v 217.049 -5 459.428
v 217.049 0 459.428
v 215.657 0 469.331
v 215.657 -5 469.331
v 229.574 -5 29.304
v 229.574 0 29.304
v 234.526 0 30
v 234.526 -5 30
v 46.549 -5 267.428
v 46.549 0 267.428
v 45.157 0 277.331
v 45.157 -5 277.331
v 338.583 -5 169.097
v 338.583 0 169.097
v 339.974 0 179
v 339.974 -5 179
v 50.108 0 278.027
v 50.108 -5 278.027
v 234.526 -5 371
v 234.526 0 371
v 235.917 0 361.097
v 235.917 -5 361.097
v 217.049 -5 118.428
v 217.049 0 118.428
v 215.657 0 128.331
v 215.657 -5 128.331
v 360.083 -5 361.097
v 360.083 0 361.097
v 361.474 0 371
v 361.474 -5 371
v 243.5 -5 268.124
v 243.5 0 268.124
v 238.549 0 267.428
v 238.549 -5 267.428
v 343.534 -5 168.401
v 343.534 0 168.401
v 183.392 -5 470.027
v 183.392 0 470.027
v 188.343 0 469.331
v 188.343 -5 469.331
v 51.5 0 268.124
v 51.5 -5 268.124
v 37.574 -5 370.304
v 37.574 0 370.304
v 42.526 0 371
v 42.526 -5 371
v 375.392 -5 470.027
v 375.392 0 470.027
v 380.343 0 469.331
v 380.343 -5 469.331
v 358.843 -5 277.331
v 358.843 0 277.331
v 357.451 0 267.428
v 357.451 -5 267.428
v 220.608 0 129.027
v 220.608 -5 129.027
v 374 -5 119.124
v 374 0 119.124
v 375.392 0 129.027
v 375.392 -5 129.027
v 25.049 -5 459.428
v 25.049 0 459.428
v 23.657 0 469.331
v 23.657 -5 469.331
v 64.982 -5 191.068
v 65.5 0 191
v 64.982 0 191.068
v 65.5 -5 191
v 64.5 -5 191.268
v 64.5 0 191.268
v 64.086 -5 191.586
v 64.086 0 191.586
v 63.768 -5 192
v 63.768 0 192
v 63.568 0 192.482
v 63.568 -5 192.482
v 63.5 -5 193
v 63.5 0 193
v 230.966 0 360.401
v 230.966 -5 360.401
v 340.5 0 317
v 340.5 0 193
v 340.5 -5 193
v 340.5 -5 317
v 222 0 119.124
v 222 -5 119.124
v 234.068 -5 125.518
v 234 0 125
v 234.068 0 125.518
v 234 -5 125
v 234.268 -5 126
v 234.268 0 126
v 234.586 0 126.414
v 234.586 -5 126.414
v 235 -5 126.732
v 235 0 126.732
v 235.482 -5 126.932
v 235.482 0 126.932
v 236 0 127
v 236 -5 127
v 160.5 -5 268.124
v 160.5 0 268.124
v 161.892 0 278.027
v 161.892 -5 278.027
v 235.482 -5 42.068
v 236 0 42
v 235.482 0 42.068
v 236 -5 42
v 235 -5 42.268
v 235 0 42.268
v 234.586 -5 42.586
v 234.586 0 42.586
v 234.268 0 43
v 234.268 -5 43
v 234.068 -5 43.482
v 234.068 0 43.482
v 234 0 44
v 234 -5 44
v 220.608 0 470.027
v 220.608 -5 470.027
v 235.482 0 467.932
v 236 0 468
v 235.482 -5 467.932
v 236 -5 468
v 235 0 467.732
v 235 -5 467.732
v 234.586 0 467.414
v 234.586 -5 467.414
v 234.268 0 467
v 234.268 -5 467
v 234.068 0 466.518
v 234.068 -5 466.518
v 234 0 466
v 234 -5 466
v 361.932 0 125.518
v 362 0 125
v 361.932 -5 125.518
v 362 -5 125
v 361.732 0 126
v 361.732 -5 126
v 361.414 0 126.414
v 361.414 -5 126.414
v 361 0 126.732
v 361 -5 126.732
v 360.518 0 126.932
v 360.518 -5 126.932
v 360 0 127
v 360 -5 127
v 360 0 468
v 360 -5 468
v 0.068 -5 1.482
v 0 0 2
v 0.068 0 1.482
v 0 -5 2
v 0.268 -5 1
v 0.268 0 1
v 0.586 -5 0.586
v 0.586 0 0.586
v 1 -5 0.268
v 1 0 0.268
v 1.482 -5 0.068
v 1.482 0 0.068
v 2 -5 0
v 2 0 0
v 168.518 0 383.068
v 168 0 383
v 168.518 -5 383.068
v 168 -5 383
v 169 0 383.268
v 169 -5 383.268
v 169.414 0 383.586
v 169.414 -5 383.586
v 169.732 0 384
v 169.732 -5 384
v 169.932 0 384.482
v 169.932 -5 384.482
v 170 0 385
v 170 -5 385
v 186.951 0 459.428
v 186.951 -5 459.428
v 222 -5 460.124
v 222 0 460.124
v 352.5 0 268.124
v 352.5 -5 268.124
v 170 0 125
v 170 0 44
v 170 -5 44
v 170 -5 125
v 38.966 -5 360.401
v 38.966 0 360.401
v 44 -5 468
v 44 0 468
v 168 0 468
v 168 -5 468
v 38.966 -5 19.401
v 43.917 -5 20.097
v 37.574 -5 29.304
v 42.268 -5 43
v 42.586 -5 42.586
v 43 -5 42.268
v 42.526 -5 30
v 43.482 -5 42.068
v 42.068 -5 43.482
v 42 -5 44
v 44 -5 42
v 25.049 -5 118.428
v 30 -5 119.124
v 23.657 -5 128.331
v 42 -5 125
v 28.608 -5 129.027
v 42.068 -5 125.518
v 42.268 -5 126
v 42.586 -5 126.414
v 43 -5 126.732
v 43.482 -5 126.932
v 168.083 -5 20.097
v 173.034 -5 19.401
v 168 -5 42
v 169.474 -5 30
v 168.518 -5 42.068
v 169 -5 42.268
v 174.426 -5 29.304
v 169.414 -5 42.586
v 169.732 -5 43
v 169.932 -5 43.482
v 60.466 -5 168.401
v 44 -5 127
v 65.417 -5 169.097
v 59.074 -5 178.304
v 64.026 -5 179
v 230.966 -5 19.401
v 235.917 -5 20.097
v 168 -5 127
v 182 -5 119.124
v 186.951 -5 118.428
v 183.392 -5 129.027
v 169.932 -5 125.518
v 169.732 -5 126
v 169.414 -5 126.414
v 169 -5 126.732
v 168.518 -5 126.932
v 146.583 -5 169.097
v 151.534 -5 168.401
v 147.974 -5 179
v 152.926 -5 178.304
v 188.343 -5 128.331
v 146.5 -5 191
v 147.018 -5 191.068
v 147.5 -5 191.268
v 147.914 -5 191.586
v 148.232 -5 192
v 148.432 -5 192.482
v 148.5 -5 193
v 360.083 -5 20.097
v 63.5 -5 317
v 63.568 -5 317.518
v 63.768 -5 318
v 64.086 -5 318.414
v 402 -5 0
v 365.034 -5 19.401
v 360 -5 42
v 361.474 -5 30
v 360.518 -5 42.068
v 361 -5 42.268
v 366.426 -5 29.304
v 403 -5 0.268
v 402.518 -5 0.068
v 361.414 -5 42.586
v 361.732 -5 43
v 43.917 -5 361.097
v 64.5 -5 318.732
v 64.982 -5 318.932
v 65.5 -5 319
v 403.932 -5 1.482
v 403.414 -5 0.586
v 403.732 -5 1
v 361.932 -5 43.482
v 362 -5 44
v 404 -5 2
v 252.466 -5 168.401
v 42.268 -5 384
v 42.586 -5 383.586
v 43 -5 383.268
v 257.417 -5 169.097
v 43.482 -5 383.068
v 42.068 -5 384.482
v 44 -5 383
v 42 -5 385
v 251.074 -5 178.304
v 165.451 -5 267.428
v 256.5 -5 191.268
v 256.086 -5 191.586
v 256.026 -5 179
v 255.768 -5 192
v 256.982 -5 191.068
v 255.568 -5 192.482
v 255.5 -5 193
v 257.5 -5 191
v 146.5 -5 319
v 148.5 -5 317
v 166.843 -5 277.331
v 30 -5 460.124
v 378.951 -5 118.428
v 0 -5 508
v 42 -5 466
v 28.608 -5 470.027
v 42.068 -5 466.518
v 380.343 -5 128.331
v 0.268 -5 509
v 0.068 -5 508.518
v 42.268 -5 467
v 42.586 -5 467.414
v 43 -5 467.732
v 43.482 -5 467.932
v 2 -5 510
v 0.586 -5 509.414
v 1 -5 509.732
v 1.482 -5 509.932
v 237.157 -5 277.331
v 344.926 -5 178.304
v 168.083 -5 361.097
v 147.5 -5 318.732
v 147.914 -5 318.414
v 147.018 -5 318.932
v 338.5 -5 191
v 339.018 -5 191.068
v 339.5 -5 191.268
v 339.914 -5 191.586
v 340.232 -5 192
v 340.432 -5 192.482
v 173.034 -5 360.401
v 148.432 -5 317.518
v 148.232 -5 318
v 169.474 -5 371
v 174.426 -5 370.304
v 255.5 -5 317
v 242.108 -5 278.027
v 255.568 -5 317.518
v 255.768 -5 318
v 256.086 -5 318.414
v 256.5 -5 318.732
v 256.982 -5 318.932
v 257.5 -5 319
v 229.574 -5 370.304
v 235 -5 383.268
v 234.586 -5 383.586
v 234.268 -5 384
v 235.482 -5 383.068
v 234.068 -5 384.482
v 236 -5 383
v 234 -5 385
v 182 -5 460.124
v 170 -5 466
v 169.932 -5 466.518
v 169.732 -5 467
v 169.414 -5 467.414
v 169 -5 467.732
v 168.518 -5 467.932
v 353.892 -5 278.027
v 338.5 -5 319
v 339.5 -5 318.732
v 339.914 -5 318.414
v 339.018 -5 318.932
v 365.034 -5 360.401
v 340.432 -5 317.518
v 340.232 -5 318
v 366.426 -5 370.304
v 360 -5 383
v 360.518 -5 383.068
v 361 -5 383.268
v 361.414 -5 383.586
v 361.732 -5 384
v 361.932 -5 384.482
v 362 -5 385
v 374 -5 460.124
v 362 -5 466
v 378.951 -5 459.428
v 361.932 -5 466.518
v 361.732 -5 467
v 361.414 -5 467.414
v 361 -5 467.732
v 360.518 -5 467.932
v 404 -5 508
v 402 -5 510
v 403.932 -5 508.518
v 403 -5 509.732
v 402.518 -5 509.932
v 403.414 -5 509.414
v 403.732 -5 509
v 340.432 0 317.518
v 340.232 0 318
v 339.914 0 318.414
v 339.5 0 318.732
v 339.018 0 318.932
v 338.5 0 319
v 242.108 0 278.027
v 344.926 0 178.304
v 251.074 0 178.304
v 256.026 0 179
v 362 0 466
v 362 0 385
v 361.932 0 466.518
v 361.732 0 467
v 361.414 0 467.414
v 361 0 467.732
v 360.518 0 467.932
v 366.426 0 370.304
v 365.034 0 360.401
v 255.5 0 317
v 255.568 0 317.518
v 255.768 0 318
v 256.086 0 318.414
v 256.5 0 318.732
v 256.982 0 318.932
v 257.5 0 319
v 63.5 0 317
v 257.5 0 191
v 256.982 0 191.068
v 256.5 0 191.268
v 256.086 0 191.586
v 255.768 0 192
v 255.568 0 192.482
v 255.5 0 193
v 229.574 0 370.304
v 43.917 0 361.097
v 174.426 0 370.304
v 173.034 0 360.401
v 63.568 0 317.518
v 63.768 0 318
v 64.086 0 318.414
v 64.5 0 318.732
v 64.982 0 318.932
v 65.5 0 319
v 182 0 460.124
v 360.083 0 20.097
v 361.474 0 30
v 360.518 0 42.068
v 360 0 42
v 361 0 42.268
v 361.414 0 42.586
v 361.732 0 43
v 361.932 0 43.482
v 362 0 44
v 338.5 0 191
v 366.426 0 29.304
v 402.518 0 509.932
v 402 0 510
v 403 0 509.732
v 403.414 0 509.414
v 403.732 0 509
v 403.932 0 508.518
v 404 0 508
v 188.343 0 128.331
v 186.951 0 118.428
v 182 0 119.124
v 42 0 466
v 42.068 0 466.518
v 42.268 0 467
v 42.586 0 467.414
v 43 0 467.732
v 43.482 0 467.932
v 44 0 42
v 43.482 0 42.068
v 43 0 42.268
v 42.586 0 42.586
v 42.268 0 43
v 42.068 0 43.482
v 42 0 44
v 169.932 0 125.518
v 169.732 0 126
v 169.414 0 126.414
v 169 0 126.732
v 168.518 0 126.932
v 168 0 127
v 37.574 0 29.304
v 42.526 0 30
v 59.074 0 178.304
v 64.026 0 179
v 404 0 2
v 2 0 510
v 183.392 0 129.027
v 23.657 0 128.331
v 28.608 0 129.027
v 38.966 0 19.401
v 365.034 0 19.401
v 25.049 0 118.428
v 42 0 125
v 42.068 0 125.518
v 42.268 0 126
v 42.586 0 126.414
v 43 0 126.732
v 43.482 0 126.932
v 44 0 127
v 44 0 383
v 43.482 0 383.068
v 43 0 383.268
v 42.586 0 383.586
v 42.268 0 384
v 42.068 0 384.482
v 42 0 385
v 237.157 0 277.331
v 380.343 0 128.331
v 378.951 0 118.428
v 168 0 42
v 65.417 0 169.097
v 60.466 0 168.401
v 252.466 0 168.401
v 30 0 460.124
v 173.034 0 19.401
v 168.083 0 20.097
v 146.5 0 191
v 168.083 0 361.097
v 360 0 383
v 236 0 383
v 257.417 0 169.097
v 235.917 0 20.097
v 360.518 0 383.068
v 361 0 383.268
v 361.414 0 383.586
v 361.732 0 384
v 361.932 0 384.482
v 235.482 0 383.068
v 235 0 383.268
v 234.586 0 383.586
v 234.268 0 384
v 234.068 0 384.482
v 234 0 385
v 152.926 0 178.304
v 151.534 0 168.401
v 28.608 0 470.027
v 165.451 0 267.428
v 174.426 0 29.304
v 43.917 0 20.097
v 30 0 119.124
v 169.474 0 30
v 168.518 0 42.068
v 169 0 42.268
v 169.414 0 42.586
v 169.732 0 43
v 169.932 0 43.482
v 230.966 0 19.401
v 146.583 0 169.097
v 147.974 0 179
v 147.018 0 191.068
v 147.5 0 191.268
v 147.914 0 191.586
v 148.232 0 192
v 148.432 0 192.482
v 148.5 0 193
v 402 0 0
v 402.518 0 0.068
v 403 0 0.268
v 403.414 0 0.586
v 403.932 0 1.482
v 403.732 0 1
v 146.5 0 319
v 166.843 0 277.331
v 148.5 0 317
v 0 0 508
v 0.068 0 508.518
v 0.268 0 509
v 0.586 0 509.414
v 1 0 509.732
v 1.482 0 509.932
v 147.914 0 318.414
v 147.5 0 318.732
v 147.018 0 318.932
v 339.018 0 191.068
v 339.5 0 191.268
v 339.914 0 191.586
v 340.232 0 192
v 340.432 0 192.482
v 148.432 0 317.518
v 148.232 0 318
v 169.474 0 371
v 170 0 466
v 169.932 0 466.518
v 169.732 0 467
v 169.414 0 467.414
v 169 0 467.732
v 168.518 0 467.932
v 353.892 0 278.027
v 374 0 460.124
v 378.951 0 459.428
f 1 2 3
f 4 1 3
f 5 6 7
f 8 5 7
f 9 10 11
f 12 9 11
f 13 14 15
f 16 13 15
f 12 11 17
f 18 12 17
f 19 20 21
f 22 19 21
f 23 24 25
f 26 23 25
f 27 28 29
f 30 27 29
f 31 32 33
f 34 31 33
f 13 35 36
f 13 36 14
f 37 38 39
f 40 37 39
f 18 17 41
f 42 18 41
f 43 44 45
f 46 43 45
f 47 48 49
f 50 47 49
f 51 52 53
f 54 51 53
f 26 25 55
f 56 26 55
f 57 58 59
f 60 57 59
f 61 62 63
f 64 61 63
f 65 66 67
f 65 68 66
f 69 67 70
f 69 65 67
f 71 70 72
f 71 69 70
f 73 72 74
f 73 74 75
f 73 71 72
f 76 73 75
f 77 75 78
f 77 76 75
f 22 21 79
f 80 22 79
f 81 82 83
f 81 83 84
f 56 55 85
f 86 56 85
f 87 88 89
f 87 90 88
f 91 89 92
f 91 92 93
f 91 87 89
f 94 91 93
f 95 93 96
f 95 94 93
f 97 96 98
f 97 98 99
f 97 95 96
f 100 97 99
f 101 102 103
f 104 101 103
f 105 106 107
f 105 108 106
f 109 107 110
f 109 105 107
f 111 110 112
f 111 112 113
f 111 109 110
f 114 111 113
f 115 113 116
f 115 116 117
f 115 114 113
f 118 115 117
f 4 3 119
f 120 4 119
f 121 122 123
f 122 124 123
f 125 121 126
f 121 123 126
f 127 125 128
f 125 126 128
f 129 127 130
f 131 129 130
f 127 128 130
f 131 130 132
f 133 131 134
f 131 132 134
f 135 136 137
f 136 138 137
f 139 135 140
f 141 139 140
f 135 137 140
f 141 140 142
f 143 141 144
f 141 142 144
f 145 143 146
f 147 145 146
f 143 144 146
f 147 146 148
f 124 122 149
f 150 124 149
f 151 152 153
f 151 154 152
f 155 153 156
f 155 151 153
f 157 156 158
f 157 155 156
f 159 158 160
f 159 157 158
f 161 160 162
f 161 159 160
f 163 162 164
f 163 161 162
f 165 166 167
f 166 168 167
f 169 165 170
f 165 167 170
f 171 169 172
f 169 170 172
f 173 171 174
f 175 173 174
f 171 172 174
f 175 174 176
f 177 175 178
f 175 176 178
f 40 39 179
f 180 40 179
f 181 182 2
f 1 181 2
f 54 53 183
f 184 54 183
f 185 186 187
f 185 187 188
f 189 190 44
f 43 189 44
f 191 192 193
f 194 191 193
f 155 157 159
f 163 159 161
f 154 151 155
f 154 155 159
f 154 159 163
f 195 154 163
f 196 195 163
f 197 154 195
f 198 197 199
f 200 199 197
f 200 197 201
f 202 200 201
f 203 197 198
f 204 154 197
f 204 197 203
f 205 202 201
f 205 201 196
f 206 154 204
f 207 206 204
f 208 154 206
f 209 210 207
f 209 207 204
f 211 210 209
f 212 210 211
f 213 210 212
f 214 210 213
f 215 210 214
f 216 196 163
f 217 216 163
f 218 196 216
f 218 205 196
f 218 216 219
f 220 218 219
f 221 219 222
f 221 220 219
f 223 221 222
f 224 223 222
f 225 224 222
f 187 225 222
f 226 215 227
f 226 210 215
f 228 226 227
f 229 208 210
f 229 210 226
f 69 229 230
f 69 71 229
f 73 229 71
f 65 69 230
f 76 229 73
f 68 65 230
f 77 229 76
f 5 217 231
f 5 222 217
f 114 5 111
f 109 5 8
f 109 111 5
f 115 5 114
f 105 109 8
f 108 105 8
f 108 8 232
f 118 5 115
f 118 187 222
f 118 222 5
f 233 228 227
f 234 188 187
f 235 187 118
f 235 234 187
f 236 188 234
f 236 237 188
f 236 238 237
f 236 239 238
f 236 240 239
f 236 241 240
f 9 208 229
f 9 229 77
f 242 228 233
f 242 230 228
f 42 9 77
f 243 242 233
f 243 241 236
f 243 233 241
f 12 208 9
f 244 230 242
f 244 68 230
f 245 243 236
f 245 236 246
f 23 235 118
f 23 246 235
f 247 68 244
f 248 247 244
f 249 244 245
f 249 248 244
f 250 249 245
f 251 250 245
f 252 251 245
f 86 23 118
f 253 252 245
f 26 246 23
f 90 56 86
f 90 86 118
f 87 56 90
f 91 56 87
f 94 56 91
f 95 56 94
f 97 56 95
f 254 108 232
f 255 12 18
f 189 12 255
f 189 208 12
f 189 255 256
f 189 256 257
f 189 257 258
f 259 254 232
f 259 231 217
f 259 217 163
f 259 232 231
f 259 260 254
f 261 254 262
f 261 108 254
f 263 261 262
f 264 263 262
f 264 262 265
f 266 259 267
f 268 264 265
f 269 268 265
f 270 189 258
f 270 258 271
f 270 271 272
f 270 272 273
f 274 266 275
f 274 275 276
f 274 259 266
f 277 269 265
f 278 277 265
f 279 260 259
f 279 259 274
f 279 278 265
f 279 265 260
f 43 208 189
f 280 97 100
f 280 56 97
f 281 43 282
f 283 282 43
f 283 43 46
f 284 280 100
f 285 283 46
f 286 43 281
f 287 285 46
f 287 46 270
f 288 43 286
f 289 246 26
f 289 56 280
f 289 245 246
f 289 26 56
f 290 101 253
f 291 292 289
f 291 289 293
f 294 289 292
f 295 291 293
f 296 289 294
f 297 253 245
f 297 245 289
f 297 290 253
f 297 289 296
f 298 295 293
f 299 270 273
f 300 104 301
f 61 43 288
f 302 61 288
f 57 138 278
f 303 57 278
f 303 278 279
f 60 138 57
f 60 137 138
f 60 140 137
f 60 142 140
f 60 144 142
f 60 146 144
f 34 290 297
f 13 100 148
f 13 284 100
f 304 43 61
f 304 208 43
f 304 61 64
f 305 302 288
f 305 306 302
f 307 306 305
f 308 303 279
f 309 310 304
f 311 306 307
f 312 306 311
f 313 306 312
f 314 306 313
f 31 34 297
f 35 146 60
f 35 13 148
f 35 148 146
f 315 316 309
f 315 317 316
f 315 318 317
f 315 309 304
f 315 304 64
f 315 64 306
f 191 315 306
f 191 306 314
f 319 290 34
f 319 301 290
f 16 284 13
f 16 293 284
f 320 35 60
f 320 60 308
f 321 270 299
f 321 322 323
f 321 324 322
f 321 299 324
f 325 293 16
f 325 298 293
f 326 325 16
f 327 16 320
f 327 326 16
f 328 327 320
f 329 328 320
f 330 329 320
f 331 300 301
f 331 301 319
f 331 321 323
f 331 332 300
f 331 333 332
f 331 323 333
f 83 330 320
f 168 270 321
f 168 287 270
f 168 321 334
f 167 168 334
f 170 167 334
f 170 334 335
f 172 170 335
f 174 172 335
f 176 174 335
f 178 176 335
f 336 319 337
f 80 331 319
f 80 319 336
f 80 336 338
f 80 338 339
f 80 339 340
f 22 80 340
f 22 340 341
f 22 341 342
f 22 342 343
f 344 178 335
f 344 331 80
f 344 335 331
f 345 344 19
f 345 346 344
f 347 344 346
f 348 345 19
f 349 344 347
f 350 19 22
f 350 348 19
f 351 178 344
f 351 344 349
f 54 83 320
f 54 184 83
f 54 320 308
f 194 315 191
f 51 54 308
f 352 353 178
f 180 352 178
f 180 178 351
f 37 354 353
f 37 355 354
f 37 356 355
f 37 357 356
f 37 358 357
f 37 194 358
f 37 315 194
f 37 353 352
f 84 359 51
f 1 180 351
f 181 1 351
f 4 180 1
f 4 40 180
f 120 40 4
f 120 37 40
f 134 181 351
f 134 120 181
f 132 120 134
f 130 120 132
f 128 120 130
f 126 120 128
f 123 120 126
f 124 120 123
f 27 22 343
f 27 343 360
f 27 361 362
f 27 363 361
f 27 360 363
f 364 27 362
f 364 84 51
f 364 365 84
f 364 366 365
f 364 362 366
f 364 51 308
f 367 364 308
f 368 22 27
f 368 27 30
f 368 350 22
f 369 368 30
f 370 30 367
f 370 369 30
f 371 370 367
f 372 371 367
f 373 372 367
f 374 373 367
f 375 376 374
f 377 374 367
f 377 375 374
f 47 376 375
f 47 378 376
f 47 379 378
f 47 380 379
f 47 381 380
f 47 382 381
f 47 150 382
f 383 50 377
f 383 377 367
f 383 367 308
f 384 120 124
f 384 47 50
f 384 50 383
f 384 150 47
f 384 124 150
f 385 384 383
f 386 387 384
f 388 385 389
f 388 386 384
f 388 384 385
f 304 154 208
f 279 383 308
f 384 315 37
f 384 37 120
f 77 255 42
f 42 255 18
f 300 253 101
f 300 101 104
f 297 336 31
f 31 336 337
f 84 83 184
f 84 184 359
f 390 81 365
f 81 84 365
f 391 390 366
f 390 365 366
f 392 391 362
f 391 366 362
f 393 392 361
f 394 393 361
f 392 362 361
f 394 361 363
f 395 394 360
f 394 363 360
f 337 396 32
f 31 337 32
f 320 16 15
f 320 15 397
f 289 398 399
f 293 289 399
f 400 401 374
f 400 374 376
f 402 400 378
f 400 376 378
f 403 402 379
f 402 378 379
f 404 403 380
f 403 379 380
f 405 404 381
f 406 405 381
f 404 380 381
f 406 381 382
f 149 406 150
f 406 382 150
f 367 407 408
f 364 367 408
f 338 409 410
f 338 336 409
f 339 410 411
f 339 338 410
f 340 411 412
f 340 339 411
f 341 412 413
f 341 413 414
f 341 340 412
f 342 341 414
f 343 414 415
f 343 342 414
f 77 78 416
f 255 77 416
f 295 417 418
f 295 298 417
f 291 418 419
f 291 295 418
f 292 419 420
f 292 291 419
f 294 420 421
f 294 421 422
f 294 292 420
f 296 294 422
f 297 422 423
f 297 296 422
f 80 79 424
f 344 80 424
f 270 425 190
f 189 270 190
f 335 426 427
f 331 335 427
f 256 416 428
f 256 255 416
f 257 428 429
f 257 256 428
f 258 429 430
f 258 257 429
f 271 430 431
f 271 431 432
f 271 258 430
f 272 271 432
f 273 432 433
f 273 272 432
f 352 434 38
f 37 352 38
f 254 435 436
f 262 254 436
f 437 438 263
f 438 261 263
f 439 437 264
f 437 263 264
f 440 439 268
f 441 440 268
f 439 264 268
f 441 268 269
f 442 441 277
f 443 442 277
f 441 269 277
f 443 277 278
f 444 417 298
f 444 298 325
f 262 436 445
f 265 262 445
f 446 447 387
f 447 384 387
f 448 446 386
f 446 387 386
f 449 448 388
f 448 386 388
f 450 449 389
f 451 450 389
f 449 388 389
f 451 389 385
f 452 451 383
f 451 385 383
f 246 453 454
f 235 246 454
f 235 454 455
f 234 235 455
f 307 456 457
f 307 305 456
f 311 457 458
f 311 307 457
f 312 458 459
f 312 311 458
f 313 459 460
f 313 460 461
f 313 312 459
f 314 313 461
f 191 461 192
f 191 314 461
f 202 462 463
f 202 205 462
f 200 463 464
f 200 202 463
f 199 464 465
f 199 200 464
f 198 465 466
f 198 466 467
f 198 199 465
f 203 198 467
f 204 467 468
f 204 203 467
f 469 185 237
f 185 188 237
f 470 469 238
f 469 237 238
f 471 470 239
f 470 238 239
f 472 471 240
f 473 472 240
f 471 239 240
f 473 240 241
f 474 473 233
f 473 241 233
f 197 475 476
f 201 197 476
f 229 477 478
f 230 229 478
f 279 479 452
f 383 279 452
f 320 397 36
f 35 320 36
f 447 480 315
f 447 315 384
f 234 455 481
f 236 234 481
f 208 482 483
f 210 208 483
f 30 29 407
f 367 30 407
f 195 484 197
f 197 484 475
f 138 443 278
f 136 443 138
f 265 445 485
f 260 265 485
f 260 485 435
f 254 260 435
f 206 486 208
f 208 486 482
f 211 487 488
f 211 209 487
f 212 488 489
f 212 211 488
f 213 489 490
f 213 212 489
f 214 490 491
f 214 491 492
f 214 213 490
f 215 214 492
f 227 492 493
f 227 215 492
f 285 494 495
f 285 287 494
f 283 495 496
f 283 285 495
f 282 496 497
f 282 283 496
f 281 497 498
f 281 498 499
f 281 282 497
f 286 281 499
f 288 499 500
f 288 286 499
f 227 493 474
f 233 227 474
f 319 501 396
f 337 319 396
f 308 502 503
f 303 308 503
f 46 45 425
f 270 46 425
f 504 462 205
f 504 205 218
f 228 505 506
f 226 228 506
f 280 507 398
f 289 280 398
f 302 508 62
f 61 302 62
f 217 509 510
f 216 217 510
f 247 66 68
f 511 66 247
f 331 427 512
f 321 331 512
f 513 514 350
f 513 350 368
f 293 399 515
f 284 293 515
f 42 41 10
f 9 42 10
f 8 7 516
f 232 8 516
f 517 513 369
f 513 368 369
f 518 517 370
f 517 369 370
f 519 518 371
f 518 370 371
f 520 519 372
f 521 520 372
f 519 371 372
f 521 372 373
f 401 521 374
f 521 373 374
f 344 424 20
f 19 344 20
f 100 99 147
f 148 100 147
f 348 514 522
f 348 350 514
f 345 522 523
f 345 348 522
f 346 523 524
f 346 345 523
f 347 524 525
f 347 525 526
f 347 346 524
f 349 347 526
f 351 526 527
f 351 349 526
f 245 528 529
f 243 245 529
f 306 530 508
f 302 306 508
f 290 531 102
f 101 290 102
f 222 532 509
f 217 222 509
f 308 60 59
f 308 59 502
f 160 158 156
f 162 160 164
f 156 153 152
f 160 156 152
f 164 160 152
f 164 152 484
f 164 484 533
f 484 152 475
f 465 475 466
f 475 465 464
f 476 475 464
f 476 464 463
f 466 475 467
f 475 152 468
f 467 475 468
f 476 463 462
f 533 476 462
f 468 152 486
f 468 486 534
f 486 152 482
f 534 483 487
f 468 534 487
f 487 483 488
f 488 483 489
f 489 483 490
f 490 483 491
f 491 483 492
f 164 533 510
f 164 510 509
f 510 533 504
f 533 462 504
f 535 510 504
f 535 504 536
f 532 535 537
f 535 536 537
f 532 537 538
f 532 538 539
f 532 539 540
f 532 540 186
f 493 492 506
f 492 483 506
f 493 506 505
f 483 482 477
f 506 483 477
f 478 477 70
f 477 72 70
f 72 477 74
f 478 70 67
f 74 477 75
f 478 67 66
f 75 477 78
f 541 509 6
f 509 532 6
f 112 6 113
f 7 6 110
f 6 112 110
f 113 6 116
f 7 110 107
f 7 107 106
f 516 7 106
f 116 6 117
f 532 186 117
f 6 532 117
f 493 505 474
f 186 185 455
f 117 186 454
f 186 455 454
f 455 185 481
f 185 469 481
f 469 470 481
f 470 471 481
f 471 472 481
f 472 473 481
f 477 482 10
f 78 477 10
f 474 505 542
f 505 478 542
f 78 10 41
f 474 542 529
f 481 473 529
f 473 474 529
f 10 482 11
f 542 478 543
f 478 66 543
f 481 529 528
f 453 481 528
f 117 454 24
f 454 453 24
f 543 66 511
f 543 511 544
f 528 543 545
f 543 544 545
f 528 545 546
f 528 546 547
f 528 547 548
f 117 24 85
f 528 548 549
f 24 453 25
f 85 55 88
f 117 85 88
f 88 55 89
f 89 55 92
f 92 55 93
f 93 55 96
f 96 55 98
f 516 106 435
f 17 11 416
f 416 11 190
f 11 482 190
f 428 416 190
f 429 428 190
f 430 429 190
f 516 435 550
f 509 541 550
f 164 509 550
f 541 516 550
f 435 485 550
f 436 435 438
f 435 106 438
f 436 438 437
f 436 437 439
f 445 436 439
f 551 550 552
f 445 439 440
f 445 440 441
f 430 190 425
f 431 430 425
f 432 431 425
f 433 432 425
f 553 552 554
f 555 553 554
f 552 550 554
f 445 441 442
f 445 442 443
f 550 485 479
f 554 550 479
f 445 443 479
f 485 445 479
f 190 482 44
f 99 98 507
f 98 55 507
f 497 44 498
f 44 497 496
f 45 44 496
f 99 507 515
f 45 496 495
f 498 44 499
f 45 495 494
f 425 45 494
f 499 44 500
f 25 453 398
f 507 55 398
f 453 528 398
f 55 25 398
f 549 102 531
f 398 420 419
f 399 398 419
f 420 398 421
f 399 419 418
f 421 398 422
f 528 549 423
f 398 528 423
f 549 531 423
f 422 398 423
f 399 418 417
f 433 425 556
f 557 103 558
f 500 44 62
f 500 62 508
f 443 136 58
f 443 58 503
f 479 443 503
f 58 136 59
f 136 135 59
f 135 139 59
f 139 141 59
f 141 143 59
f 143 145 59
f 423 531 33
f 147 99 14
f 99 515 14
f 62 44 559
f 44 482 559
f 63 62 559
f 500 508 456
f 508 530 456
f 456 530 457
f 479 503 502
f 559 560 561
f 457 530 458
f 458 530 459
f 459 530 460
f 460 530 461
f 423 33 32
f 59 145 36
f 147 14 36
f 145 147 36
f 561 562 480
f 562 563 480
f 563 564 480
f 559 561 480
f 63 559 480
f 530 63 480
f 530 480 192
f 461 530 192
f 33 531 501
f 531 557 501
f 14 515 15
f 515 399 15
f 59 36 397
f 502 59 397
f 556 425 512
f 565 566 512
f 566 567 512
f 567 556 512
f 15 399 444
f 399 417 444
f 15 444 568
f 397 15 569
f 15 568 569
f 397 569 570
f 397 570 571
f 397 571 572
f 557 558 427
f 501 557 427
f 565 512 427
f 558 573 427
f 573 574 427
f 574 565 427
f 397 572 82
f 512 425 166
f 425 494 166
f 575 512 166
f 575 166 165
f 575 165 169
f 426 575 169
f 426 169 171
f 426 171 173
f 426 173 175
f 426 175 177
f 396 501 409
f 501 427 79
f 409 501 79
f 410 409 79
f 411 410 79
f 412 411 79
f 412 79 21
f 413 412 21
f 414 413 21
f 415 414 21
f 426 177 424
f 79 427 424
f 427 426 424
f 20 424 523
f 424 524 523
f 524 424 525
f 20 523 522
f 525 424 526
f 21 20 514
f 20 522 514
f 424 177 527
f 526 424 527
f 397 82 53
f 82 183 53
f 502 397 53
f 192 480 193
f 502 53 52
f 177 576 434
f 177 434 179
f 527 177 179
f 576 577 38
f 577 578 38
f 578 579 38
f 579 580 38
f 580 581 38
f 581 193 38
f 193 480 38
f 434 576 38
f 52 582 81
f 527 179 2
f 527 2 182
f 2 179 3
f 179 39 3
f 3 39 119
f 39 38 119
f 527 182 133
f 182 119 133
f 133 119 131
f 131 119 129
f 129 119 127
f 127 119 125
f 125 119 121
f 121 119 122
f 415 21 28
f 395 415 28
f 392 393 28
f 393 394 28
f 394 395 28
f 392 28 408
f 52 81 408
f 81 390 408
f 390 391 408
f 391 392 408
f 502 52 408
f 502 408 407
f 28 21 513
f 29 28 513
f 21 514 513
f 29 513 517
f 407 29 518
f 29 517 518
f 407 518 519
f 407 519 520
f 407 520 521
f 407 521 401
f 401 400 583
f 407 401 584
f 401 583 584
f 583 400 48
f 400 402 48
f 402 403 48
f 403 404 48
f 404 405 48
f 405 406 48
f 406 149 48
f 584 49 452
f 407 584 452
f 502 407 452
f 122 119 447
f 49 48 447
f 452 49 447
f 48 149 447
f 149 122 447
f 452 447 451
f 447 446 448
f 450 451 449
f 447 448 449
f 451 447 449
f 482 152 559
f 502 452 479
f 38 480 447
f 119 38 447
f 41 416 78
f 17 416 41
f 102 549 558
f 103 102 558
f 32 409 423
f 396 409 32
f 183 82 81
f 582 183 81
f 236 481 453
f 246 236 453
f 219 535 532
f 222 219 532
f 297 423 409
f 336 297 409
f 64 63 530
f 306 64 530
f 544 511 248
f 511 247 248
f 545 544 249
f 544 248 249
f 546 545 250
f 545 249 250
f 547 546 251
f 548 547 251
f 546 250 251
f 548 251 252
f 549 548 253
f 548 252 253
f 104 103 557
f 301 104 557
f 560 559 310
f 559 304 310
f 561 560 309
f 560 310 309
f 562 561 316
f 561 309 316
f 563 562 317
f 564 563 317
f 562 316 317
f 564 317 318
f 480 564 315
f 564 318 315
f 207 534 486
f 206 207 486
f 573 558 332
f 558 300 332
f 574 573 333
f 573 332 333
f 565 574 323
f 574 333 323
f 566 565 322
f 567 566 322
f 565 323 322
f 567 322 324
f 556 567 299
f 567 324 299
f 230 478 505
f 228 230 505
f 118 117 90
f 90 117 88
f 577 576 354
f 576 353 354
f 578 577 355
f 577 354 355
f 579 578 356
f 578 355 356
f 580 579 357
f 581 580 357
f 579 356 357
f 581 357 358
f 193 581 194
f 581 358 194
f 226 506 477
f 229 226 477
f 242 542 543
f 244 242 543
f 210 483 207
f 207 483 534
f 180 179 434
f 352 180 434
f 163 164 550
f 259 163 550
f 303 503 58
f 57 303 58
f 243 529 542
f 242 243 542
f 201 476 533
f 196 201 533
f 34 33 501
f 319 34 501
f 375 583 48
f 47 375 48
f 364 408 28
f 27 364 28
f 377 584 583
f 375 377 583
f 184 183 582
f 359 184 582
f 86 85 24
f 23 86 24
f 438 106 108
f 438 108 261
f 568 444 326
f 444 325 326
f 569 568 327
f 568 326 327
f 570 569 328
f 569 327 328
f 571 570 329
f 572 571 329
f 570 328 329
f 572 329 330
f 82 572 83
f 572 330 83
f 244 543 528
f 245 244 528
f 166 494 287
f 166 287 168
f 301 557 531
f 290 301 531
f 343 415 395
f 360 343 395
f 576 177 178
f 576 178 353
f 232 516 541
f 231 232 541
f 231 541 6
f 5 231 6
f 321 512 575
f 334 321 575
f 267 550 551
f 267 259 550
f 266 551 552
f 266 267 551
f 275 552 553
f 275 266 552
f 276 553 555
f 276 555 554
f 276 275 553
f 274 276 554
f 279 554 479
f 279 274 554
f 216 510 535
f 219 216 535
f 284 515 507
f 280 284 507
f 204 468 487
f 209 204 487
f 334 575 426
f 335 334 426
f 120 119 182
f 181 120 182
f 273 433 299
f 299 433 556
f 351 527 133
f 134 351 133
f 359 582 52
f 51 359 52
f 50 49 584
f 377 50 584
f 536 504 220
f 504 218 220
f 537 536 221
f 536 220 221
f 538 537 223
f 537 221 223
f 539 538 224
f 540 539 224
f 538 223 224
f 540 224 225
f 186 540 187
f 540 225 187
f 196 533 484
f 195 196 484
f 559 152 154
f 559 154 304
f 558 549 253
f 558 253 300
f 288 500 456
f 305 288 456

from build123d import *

# Parameters (mm, degrees)
F0_W     = 404
F0_H     = 510
F0_W_2   = 84.9999959469
F0_H_2   = 127.9999959469
F0_W_3   = 128
F0_H_3   = 85
F0_W_4   = 128.0000081062
F0_H_4   = 85.0000081062
F0_W_5   = 85
F0_H_5   = 128
F1_DEPTH = 5
F2_R     = 2


with BuildPart() as f1:
    # F0 (on Front) → F1 (new body)
    with BuildSketch(Plane.XZ):
        with Locations((202, 255)):
            Rectangle(F0_W, F0_H)
        Polygon((37.5742387427, 29.3041344952), (42.5255790864, 30), (43.917310096, 20.0973193126), (38.9659697523, 19.4014538078), align=None, mode=Mode.SUBTRACT)
        Polygon((28.6082689904, 129.0268068742), (30, 119.1241261867), (25.0486596563, 118.4282606819), (23.6569286467, 128.3309413694), align=None, mode=Mode.SUBTRACT)
        Polygon((168.082689904, 20.0973193126), (169.4744209136, 30), (174.4257612573, 29.3041344952), (173.0340302477, 19.4014538078), align=None, mode=Mode.SUBTRACT)
        Polygon((42.5255790864, 30), (30, 30), (30, 119.1241261867), (30, 139), (182, 139), (182, 119.1241261867), (182, 30), (169.4744209136, 30), align=None, mode=Mode.SUBTRACT)
        Polygon((186.9513403437, 118.4282606819), (182, 119.1241261867), (183.3917310096, 129.0268068742), (188.3430713533, 128.3309413694), align=None, mode=Mode.SUBTRACT)
        Polygon((59.0742387427, 178.3041344952), (64.0255790864, 179), (65.417310096, 169.0973193126), (60.4659697523, 168.4014538078), align=None, mode=Mode.SUBTRACT)
        Polygon((146.582689904, 169.0973193126), (147.9744209136, 179), (152.9257612573, 178.3041344952), (151.5340302477, 168.4014538078), align=None, mode=Mode.SUBTRACT)
        Polygon((229.5742387427, 29.3041344952), (234.5255790864, 30), (235.917310096, 20.0973193126), (230.9659697523, 19.4014538078), align=None, mode=Mode.SUBTRACT)
        Polygon((220.6082689904, 129.0268068742), (222, 119.1241261867), (217.0486596563, 118.4282606819), (215.6569286467, 128.3309413694), align=None, mode=Mode.SUBTRACT)
        Polygon((234.5255790864, 30), (222, 30), (222, 119.1241261867), (222, 139), (374, 139), (374, 119.1241261867), (374, 30), (361.4744209136, 30), align=None, mode=Mode.SUBTRACT)
        Polygon((360.082689904, 20.0973193126), (361.4744209136, 30), (366.4257612573, 29.3041344952), (365.0340302477, 19.4014538078), align=None, mode=Mode.SUBTRACT)
        Polygon((378.9513403437, 118.4282606819), (374, 119.1241261867), (375.3917310096, 129.0268068742), (380.3430713533, 128.3309413694), align=None, mode=Mode.SUBTRACT)
        Polygon((251.0742387427, 178.3041344952), (256.0255790864, 179), (257.417310096, 169.0973193126), (252.4659697523, 168.4014538078), align=None, mode=Mode.SUBTRACT)
        Polygon((338.582689904, 169.0973193126), (339.9744209136, 179), (344.9257612573, 178.3041344952), (343.5340302477, 168.4014538078), align=None, mode=Mode.SUBTRACT)
        Polygon((50.1082689904, 278.0268068742), (51.5, 268.1241261867), (46.5486596563, 267.4282606819), (45.1569286467, 277.3309413694), align=None, mode=Mode.SUBTRACT)
        Polygon((37.5742387427, 370.3041344952), (42.5255790864, 371), (43.917310096, 361.0973193126), (38.9659697523, 360.4014538078), align=None, mode=Mode.SUBTRACT)
        Polygon((64.0255790864, 179), (51.5, 179), (51.5, 268.1241261867), (51.5, 331), (160.5, 331), (160.5, 268.1241261867), (160.5, 179), (147.9744209136, 179), align=None, mode=Mode.SUBTRACT)
        Polygon((165.4513403437, 267.4282606819), (160.5, 268.1241261867), (161.8917310096, 278.0268068742), (166.8430713533, 277.3309413694), align=None, mode=Mode.SUBTRACT)
        Polygon((168.082689904, 361.0973193126), (169.4744209136, 371), (174.4257612573, 370.3041344952), (173.0340302477, 360.4014538078), align=None, mode=Mode.SUBTRACT)
        Polygon((28.6082689904, 470.0268068742), (30, 460.1241261867), (25.0486596563, 459.4282606819), (23.6569286467, 469.3309413694), align=None, mode=Mode.SUBTRACT)
        Polygon((42.5255790864, 371), (30, 371), (30, 460.1241261867), (30, 480), (182, 480), (182, 460.1241261867), (182, 371), (169.4744209136, 371), align=None, mode=Mode.SUBTRACT)
        Polygon((186.9513403437, 459.4282606819), (182, 460.1241261867), (183.3917310096, 470.0268068742), (188.3430713533, 469.3309413694), align=None, mode=Mode.SUBTRACT)
        Polygon((242.1082689904, 278.0268068742), (243.5, 268.1241261867), (238.5486596563, 267.4282606819), (237.1569286467, 277.3309413694), align=None, mode=Mode.SUBTRACT)
        Polygon((256.0255790864, 179), (243.5, 179), (243.5, 268.1241261867), (243.5, 331), (352.5, 331), (352.5, 268.1241261867), (352.5, 179), (339.9744209136, 179), align=None, mode=Mode.SUBTRACT)
        Polygon((229.5742387427, 370.3041344952), (234.5255790864, 371), (235.917310096, 361.0973193126), (230.9659697523, 360.4014538078), align=None, mode=Mode.SUBTRACT)
        Polygon((357.4513403437, 267.4282606819), (352.5, 268.1241261867), (353.8917310096, 278.0268068742), (358.8430713533, 277.3309413694), align=None, mode=Mode.SUBTRACT)
        Polygon((360.082689904, 361.0973193126), (361.4744209136, 371), (366.4257612573, 370.3041344952), (365.0340302477, 360.4014538078), align=None, mode=Mode.SUBTRACT)
        Polygon((234.5255790864, 371), (222, 371), (222, 460.1241261867), (222, 480), (374, 480), (374, 460.1241261867), (374, 371), (361.4744209136, 371), align=None, mode=Mode.SUBTRACT)
        Polygon((220.6082689904, 470.0268068742), (222, 460.1241261867), (217.0486596563, 459.4282606819), (215.6569286467, 469.3309413694), align=None, mode=Mode.SUBTRACT)
        Polygon((378.9513403437, 459.4282606819), (374, 460.1241261867), (375.3917310096, 470.0268068742), (380.3430713533, 469.3309413694), align=None, mode=Mode.SUBTRACT)
        Polygon((51.5, 268.1241261867), (51.5, 179), (64.0255790864, 179), (147.9744209136, 179), (160.5, 179), (160.5, 268.1241261867), (160.5, 331), (51.5, 331), align=None)
        with Locations((106, 255)):
            Rectangle(F0_W_2, F0_H_2, mode=Mode.SUBTRACT)
        Polygon((30, 119.1241261867), (30, 30), (42.5255790864, 30), (169.4744209136, 30), (182, 30), (182, 119.1241261867), (182, 139), (30, 139), align=None)
        with Locations((106, 84.5)):
            Rectangle(F0_W_3, F0_H_3, mode=Mode.SUBTRACT)
        Polygon((222, 119.1241261867), (222, 30), (234.5255790864, 30), (361.4744209136, 30), (374, 30), (374, 119.1241261867), (374, 139), (222, 139), align=None)
        with Locations((298, 84.5)):
            Rectangle(F0_W_4, F0_H_4, mode=Mode.SUBTRACT)
        Polygon((243.5, 268.1241261867), (243.5, 179), (256.0255790864, 179), (339.9744209136, 179), (352.5, 179), (352.5, 268.1241261867), (352.5, 331), (243.5, 331), align=None)
        with Locations((298, 255)):
            Rectangle(F0_W_5, F0_H_5, mode=Mode.SUBTRACT)
        Polygon((30, 460.1241261867), (30, 371), (42.5255790864, 371), (169.4744209136, 371), (182, 371), (182, 460.1241261867), (182, 480), (30, 480), align=None)
        with Locations((106, 425.5)):
            Rectangle(F0_W_3, F0_H_3, mode=Mode.SUBTRACT)
        Polygon((222, 460.1241261867), (222, 371), (234.5255790864, 371), (361.4744209136, 371), (374, 371), (374, 460.1241261867), (374, 480), (222, 480), align=None)
        with Locations((298, 425.5)):
            Rectangle(F0_W_3, F0_H_3, mode=Mode.SUBTRACT)
    extrude(amount=F1_DEPTH)

    # F2
    f2_edges = [f1.edges().sort_by_distance(p)[0] for p in [
        (0, -2.5, 510),
        (404, -2.5, 510),
        (0, -2.5, 0),
        (404, -2.5, 0),
        (233.999996, -2.5, 127.000004),
        (255.5, -2.5, 319),
        (63.500002, -2.5, 318.999998),
        (42, -2.5, 127),
        (234, -2.5, 468),
        (42, -2.5, 468),
        (170, -2.5, 468),
        (362, -2.5, 468),
        (340.5, -2.5, 319),
        (148.499998, -2.5, 318.999998),
        (170, -2.5, 127),
        (362.000004, -2.5, 127.000004),
        (362.000004, -2.5, 41.999996),
        (170, -2.5, 42),
        (148.499998, -2.5, 191.000002),
        (340.5, -2.5, 191),
        (170, -2.5, 383),
        (362, -2.5, 383),
        (42, -2.5, 42),
        (233.999996, -2.5, 41.999996),
        (255.5, -2.5, 191),
        (63.500002, -2.5, 191.000002),
        (42, -2.5, 383),
        (234, -2.5, 383),
    ]]
    fillet(f2_edges, radius=F2_R)


solid = f1.part
